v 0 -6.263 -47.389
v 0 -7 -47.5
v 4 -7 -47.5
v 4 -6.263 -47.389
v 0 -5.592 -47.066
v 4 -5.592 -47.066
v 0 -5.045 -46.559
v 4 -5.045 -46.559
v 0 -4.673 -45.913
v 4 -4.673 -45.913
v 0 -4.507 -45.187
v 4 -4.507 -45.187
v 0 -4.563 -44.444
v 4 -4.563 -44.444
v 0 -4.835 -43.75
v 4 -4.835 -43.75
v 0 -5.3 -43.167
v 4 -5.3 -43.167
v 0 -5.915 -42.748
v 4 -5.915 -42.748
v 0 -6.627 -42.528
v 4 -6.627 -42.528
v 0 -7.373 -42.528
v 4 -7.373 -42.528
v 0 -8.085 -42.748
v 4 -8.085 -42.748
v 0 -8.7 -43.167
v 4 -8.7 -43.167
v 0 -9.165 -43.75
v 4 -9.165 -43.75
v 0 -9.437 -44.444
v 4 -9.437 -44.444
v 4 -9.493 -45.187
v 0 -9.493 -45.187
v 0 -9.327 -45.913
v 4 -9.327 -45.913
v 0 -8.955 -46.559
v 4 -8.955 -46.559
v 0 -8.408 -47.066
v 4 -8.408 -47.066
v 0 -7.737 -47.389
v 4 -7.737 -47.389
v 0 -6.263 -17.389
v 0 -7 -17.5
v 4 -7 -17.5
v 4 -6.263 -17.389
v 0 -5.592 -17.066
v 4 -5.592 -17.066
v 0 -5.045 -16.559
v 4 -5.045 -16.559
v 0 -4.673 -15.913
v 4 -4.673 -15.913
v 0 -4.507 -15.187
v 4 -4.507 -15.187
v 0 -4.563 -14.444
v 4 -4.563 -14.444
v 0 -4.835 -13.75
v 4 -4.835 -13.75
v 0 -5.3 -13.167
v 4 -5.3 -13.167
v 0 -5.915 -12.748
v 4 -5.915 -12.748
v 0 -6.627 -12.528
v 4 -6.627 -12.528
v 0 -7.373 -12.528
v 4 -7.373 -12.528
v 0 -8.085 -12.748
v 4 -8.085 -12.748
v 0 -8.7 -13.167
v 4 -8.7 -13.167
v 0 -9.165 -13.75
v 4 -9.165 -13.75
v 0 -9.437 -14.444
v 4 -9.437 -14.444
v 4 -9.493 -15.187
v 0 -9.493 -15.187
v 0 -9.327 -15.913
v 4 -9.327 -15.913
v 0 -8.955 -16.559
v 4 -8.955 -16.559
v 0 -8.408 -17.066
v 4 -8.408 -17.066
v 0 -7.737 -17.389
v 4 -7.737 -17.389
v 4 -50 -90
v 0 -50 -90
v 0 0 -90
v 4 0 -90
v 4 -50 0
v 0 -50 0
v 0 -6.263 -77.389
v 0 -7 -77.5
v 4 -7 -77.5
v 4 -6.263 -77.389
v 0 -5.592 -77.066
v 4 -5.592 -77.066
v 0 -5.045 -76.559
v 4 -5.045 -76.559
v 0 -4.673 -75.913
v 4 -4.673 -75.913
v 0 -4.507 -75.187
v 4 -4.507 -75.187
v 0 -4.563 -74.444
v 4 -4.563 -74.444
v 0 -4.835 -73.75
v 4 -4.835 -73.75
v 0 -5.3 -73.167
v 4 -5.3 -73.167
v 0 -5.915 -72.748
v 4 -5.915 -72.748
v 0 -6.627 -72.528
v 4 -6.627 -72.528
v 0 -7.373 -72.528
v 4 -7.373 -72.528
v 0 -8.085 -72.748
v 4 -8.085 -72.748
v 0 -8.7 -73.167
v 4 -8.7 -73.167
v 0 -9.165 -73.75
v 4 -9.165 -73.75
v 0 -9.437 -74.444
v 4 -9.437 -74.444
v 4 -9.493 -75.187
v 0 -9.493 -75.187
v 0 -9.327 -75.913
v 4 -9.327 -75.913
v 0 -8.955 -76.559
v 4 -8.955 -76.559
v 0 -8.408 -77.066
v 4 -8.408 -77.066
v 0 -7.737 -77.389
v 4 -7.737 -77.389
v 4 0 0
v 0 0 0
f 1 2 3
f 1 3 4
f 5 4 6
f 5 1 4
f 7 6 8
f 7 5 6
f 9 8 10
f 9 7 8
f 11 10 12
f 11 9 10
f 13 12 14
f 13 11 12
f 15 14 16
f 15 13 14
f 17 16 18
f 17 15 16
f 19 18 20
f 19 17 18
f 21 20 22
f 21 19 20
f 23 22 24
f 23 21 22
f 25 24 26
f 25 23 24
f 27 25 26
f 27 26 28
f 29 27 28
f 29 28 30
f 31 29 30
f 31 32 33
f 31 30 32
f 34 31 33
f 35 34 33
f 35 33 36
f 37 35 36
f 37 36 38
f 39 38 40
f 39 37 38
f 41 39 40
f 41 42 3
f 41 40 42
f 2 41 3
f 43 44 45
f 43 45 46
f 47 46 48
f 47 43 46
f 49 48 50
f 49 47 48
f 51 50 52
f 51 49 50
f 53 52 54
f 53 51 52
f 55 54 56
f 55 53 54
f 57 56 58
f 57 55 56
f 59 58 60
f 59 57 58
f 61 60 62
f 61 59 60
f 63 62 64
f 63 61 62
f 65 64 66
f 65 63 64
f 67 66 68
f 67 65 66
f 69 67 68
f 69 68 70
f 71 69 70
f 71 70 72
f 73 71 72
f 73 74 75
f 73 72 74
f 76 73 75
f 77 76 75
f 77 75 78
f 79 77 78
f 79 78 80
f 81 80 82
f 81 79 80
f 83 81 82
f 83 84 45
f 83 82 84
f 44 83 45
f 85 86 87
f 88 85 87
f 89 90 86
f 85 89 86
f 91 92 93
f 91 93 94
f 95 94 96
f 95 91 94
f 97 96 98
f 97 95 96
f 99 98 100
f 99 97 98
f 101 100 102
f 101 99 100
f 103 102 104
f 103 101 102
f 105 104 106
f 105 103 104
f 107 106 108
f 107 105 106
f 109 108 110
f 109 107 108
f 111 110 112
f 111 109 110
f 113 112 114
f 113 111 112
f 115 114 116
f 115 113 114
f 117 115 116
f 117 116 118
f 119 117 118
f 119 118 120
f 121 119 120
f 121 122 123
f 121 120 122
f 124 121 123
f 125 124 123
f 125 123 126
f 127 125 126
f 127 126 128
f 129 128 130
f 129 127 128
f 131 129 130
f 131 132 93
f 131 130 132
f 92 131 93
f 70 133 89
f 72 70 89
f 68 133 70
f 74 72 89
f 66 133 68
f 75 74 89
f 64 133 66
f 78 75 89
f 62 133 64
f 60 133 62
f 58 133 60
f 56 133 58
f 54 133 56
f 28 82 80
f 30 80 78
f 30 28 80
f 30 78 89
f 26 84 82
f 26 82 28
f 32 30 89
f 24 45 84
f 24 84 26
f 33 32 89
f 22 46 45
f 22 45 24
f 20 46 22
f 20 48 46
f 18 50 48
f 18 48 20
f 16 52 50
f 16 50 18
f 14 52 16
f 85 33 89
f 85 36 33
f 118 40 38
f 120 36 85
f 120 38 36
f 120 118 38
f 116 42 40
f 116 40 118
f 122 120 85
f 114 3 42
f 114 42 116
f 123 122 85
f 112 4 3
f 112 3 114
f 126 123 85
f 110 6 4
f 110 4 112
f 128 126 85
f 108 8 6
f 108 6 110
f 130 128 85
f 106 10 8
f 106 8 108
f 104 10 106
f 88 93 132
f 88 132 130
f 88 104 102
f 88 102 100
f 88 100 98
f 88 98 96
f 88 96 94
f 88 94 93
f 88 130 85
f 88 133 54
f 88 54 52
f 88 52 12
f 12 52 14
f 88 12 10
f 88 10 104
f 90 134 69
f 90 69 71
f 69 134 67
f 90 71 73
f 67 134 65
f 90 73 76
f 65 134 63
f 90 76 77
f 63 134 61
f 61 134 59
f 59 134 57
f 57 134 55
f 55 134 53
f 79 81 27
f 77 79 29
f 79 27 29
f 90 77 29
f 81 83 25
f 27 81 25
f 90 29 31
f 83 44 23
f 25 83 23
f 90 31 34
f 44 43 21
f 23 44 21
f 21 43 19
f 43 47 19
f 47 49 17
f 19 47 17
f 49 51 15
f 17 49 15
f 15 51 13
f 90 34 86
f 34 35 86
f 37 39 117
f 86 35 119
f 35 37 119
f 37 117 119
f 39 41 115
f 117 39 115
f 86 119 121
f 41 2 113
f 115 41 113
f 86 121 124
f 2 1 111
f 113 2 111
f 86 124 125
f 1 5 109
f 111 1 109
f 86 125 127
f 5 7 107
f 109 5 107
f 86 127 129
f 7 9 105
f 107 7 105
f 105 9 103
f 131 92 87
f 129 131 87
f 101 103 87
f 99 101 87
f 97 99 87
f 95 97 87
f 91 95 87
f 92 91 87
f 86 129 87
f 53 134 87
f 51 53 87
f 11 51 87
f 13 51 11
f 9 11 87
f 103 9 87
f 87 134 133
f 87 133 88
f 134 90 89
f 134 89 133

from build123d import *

# Parameters (mm, degrees)
SKETCH1_W               = 90
SKETCH1_H               = 50
BOSS_EXTRUDE1_DEPTH     = 4
CUT_EXTRUDE1_DEPTH      = 104.033974979
CUT_EXTRUDE1_DEPTH_BACK = 104.033974979
SKETCH2_R               = 2.5


with BuildPart() as part:
    # Sketch1 → Boss-Extrude1 (new body)
    with BuildSketch(Plane(origin=(0, 0, 0), x_dir=(0, 0, -1), z_dir=(1, 0, 0))):
        with Locations((45, -25)):
            Rectangle(SKETCH1_W, SKETCH1_H)
    extrude(amount=BOSS_EXTRUDE1_DEPTH)

    # Sketch2 → Cut-Extrude1 (cut, two sides: drawn at the far end of the back side and taken through both)
    with BuildSketch(Plane(origin=(4, 0, 0), x_dir=(0, 0, -1), z_dir=(1, 0, 0)).offset(-CUT_EXTRUDE1_DEPTH_BACK)):
        with Locations((15, -7)):
            Circle(SKETCH2_R)
        with Locations((45, -7)):
            Circle(SKETCH2_R)
        with Locations((75, -7)):
            Circle(SKETCH2_R)
    extrude(amount=CUT_EXTRUDE1_DEPTH + CUT_EXTRUDE1_DEPTH_BACK, mode=Mode.SUBTRACT)


solid = part.part
